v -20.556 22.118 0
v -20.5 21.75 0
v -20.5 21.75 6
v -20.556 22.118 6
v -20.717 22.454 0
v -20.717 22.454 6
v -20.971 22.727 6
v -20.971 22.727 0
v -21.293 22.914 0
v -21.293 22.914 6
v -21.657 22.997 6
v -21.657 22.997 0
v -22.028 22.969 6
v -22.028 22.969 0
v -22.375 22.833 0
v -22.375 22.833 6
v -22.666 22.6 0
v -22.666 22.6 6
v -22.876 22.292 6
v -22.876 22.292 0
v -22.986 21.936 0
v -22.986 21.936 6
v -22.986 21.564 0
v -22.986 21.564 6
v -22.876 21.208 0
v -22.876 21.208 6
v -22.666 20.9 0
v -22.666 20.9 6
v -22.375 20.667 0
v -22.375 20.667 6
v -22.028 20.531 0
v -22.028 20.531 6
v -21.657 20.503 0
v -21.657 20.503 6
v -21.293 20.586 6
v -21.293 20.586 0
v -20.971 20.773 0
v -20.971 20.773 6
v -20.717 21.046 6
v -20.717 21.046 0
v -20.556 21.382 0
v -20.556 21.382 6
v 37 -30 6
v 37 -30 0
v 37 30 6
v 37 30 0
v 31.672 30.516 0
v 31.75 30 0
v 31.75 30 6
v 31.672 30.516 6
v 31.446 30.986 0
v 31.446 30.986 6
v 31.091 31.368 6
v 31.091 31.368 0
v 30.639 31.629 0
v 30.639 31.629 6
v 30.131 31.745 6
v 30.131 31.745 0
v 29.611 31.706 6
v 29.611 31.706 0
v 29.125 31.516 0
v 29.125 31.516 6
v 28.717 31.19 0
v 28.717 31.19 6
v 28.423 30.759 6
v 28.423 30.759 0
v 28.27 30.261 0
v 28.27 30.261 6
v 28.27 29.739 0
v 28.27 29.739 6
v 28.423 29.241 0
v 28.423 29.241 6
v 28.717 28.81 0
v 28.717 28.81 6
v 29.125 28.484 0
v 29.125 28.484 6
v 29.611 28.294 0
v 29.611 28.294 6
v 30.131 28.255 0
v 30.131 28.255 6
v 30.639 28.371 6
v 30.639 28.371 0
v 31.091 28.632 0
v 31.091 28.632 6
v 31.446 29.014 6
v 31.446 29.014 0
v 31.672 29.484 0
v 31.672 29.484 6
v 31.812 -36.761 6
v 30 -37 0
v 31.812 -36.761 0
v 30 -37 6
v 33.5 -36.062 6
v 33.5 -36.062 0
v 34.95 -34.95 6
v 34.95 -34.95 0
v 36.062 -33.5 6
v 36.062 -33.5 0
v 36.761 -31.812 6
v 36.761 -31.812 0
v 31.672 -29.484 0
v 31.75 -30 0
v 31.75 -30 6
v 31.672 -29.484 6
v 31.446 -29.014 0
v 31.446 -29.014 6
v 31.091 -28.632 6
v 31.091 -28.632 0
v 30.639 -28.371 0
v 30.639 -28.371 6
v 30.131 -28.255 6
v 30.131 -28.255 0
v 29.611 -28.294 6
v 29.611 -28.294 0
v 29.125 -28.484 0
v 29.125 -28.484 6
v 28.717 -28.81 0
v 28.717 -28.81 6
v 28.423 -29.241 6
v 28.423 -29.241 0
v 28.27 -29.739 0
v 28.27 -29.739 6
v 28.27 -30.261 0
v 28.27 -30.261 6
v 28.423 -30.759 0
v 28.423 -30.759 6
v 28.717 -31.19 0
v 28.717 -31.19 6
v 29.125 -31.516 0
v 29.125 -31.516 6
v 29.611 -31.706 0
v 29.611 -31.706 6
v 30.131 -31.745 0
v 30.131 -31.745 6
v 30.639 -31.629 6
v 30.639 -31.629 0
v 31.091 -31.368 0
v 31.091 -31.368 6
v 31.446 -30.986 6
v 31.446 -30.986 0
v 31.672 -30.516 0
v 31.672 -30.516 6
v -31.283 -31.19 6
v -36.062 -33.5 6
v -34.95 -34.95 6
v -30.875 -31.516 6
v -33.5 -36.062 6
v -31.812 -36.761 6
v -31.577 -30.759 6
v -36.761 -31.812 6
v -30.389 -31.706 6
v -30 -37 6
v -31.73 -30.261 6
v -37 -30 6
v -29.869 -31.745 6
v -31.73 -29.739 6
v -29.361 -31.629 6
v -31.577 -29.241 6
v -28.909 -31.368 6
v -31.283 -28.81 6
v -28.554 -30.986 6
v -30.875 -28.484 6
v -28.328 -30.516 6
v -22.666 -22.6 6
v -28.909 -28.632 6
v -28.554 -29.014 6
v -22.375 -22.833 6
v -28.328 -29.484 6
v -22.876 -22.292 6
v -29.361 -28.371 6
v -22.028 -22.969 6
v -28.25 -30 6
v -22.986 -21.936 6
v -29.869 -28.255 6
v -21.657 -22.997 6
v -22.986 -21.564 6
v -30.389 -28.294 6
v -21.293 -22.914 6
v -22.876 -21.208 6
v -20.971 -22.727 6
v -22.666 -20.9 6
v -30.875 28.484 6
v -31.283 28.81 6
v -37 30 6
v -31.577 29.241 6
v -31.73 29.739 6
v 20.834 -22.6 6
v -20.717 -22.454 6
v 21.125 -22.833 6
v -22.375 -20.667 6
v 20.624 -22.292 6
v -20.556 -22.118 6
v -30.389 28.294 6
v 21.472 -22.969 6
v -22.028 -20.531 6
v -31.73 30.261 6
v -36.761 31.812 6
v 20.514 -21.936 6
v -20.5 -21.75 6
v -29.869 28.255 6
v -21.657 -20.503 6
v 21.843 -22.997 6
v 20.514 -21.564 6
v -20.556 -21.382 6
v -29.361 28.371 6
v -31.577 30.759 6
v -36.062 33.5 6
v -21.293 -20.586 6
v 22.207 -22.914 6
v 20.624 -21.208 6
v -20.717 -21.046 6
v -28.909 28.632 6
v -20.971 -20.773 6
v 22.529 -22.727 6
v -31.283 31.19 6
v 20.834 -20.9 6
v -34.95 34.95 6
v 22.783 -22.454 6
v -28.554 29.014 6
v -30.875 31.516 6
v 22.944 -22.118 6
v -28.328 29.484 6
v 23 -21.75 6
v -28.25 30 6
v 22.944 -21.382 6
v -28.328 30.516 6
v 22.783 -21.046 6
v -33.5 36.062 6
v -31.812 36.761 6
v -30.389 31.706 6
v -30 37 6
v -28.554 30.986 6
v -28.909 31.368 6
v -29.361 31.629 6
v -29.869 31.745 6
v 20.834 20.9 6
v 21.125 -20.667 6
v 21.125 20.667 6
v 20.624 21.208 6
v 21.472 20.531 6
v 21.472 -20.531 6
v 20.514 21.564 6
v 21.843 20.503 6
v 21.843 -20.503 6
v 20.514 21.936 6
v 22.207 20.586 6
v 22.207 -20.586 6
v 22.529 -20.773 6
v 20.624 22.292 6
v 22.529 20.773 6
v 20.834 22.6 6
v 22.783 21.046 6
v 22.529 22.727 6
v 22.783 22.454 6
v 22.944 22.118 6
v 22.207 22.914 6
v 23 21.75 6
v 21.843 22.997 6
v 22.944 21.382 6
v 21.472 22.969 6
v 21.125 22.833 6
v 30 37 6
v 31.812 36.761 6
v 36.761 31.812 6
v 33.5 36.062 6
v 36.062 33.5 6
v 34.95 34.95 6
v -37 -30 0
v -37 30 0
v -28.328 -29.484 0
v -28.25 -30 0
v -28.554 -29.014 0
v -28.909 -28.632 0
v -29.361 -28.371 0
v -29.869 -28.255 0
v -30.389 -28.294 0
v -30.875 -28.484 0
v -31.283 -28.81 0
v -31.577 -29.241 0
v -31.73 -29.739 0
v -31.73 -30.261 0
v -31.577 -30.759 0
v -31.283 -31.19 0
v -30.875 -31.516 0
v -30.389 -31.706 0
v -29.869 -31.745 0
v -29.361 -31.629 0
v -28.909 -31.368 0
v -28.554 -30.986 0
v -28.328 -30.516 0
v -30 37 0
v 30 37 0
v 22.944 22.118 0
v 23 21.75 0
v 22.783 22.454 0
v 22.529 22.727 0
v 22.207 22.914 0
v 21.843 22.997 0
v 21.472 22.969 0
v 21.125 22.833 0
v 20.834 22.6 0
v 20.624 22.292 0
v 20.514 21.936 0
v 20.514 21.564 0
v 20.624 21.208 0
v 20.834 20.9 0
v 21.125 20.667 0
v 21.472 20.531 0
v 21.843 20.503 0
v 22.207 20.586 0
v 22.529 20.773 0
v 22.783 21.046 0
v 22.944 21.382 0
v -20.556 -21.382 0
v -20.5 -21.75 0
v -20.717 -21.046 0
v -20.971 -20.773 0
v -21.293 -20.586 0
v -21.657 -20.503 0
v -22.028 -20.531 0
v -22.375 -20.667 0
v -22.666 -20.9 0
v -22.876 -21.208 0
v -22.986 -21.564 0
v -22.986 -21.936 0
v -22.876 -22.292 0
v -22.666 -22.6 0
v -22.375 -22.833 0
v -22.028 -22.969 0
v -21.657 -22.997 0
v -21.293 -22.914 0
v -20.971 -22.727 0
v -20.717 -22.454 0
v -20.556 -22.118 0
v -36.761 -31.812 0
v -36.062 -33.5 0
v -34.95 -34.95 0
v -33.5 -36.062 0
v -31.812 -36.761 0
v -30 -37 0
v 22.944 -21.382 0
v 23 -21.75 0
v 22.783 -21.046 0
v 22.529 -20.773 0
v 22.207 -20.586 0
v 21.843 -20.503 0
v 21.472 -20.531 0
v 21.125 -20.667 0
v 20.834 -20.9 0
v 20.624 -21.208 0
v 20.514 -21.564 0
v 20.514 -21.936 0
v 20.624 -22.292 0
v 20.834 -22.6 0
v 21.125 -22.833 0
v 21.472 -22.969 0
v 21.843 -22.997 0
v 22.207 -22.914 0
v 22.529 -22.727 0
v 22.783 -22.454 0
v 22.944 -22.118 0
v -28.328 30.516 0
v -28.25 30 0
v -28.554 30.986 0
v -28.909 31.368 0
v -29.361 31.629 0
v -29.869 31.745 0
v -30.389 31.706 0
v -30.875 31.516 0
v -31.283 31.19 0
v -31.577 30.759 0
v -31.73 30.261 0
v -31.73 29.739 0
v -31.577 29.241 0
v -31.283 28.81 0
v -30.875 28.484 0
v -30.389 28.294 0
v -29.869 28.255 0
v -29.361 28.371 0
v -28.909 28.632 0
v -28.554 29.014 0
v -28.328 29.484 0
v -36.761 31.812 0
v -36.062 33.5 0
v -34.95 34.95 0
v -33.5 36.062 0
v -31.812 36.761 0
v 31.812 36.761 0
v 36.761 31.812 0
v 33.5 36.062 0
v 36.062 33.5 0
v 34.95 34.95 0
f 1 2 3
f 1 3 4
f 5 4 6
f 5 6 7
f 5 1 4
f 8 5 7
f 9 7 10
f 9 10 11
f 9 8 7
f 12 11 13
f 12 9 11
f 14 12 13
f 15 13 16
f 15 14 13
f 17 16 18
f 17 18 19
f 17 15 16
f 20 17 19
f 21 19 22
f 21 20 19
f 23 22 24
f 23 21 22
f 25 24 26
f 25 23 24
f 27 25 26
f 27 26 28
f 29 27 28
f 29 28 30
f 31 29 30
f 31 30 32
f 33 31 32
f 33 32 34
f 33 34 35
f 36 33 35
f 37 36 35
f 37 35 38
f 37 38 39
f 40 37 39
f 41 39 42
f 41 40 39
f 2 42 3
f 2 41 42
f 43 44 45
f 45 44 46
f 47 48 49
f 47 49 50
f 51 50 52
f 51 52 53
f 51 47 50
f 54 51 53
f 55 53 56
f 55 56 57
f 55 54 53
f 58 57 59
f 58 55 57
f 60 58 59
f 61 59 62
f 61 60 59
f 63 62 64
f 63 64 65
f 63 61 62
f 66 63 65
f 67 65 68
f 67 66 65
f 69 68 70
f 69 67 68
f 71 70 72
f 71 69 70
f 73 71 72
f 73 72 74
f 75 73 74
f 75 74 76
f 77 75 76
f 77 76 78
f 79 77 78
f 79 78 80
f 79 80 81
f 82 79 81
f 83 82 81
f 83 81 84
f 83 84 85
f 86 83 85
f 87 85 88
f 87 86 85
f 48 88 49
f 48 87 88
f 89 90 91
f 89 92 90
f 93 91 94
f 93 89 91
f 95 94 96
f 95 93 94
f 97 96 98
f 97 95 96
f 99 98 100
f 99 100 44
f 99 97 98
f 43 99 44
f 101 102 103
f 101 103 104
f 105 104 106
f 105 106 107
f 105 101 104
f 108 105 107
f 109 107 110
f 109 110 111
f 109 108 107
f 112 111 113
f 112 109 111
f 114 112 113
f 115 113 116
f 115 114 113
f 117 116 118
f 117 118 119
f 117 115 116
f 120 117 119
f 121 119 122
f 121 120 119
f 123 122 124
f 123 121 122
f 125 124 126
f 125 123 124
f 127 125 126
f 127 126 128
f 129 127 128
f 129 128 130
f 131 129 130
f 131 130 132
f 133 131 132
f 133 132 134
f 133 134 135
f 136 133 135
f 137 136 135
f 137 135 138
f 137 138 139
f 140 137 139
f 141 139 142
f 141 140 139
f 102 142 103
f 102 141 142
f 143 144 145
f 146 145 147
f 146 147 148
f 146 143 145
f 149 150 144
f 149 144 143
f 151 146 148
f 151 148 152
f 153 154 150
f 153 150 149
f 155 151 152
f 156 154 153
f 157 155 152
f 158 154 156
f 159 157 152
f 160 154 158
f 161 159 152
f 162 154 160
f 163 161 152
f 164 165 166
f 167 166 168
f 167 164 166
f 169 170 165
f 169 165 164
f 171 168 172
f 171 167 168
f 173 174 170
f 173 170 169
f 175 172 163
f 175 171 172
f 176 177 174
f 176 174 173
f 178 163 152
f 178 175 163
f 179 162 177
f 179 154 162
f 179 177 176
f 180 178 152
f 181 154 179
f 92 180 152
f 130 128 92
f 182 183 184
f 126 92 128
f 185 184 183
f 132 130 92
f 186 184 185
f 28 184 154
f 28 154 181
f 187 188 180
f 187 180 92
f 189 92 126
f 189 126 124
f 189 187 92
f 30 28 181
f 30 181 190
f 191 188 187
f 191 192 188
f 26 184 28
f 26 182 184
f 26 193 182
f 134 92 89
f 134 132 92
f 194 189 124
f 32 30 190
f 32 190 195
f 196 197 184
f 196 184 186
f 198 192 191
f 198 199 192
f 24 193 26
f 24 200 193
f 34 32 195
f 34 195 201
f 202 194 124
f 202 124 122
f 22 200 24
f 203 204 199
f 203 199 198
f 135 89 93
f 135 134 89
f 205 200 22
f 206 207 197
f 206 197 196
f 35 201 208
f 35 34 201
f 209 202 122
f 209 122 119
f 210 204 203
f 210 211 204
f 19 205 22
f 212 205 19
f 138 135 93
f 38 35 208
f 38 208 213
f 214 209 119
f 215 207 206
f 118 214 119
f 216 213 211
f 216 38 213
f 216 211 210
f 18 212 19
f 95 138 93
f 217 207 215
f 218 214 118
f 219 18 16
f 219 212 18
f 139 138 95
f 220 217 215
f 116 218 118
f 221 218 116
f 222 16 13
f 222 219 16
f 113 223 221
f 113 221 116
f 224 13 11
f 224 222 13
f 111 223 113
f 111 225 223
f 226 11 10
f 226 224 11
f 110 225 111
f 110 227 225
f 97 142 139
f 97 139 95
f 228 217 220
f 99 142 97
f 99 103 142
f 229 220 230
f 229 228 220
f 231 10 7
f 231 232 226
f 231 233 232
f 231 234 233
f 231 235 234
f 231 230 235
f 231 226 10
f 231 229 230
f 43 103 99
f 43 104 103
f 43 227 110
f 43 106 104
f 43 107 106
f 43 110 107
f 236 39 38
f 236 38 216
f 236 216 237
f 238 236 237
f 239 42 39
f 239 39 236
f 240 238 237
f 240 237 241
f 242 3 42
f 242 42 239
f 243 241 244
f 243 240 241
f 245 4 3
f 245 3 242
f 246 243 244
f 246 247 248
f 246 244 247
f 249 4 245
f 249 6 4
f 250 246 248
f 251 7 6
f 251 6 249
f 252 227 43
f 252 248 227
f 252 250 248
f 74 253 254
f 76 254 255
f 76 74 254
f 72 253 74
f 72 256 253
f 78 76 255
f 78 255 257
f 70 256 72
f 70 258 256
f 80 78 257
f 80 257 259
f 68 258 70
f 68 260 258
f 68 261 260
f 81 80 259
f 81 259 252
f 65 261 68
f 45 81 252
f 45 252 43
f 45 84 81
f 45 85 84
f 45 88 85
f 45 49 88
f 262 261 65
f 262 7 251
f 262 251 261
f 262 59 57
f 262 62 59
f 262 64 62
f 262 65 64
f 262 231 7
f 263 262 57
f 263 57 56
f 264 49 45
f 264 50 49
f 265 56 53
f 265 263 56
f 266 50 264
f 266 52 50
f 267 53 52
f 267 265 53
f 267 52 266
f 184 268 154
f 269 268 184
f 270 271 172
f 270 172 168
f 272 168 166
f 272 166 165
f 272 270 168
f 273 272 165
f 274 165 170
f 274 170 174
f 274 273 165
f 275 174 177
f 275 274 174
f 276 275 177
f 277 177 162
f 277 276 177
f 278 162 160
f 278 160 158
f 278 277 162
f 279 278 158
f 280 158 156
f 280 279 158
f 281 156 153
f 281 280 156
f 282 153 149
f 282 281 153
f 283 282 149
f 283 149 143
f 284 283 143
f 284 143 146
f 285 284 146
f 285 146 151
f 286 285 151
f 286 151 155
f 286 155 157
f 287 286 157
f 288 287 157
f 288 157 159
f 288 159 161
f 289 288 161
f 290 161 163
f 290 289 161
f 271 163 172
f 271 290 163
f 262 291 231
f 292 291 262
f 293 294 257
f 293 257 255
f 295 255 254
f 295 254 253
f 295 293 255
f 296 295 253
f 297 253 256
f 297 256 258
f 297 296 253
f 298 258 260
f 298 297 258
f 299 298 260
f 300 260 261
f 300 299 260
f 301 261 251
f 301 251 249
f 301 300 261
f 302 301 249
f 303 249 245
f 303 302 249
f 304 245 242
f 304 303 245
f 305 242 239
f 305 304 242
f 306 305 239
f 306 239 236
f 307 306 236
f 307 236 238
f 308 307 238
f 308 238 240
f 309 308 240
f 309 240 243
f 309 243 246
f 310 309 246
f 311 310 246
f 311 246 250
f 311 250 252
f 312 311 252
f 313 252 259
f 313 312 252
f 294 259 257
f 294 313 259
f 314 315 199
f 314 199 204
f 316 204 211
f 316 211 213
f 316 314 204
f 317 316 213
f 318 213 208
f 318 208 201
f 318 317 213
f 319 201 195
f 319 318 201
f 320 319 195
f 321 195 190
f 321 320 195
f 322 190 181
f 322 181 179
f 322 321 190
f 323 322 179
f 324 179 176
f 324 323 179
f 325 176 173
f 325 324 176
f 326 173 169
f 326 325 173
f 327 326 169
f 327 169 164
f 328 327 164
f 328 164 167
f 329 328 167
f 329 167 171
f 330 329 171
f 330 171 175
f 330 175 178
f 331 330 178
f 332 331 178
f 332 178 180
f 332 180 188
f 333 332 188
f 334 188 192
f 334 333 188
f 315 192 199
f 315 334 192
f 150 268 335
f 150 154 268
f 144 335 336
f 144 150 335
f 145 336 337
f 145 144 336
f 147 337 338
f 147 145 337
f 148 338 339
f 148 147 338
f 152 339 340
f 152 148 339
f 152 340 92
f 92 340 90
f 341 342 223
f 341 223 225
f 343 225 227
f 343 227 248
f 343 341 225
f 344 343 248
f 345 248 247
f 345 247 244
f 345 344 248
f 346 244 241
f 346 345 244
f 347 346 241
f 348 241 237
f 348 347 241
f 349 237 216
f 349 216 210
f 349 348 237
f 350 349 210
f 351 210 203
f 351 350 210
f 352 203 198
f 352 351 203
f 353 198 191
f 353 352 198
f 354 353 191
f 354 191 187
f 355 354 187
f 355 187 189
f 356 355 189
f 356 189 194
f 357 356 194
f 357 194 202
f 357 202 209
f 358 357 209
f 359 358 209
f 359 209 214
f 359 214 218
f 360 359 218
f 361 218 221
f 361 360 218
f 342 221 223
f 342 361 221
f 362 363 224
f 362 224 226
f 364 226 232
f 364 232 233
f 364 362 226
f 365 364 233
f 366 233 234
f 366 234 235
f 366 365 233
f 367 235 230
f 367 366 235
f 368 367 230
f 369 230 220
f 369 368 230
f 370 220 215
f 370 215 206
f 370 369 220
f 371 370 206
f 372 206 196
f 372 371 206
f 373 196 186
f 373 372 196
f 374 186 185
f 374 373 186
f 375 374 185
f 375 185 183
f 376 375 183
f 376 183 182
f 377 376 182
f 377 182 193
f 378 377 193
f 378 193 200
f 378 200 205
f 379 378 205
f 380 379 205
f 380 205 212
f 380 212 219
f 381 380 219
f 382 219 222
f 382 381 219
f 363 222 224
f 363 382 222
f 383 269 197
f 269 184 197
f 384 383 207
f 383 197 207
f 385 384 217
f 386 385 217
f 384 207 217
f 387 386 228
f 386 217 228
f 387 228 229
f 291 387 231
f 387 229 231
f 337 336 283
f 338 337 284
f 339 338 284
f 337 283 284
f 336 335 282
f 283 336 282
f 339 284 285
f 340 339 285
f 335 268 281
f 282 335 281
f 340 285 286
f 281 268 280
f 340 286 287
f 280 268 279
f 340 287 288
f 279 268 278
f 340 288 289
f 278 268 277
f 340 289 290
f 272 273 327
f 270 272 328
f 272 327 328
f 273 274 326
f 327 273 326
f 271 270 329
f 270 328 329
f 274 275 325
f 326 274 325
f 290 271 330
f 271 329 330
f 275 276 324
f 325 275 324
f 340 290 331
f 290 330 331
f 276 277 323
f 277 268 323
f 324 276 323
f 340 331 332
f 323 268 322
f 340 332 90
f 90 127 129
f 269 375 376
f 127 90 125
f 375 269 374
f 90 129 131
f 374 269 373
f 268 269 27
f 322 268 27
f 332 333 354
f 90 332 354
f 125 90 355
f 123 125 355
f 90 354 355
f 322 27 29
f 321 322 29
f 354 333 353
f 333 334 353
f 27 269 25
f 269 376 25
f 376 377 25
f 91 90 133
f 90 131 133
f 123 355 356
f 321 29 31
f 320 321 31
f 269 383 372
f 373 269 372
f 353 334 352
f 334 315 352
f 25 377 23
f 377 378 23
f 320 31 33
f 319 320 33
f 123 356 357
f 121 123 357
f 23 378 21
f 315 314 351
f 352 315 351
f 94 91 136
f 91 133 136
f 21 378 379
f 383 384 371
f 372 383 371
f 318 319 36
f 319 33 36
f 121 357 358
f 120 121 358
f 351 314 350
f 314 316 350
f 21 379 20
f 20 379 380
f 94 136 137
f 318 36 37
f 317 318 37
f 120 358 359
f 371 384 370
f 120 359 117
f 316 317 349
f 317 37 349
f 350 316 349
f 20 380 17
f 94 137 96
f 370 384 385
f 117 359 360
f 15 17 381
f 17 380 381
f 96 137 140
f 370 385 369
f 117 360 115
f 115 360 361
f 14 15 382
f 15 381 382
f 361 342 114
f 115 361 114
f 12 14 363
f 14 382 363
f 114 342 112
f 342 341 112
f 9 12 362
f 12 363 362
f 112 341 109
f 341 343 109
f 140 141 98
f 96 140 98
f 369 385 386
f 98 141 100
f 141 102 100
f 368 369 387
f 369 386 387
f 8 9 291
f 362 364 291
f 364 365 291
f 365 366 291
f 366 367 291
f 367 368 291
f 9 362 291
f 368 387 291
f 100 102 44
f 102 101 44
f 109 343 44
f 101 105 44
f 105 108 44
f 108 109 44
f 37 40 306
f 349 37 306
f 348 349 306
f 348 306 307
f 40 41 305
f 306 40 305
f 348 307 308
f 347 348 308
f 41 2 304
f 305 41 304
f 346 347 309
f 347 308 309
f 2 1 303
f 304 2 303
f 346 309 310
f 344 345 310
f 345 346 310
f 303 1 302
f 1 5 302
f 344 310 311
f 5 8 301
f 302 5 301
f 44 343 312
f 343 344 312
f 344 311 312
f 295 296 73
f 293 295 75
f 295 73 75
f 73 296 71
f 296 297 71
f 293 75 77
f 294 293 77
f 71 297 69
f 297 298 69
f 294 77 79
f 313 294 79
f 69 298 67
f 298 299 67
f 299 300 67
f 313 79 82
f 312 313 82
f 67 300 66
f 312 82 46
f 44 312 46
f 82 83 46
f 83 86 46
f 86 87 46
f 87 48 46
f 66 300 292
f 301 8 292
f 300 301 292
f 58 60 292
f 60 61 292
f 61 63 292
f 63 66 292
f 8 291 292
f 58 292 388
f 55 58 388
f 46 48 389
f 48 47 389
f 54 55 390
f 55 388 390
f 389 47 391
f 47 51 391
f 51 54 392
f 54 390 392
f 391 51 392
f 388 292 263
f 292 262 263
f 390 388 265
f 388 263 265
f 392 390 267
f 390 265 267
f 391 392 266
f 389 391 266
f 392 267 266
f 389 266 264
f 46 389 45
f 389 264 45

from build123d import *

# Parameters (mm, degrees)
ESQUISSE1_W        = 74
ESQUISSE1_H        = 74
ESQUISSE1_R        = 1.75
ESQUISSE1_R_2      = 1.25
BOSS_EXTRU_1_DEPTH = 6
CONG_1_R           = 7


with BuildPart() as part:
    # Esquisse1 → Boss.-Extru.1 (new body)
    with BuildSketch(Plane.XY):
        Rectangle(ESQUISSE1_W, ESQUISSE1_H)
        with Locations((-30, 30)):
            Circle(ESQUISSE1_R, mode=Mode.SUBTRACT)
        with Locations((-21.75, 21.75)):
            Circle(ESQUISSE1_R_2, mode=Mode.SUBTRACT)
        with Locations((30, 30)):
            Circle(ESQUISSE1_R, mode=Mode.SUBTRACT)
        with Locations((21.75, 21.75)):
            Circle(ESQUISSE1_R_2, mode=Mode.SUBTRACT)
        with Locations((21.75, -21.75)):
            Circle(ESQUISSE1_R_2, mode=Mode.SUBTRACT)
        with Locations((-21.75, -21.75)):
            Circle(ESQUISSE1_R_2, mode=Mode.SUBTRACT)
        with Locations((-30, -30)):
            Circle(ESQUISSE1_R, mode=Mode.SUBTRACT)
        with Locations((30, -30)):
            Circle(ESQUISSE1_R, mode=Mode.SUBTRACT)
    extrude(amount=BOSS_EXTRU_1_DEPTH)

    # Congé1
    cong_1_edges = [part.edges().sort_by_distance(p)[0] for p in [
        (-37, 37, 3),
        (37, 37, 3),
        (37, -37, 3),
        (-37, -37, 3),
    ]]
    fillet(cong_1_edges, radius=CONG_1_R)


solid = part.part
